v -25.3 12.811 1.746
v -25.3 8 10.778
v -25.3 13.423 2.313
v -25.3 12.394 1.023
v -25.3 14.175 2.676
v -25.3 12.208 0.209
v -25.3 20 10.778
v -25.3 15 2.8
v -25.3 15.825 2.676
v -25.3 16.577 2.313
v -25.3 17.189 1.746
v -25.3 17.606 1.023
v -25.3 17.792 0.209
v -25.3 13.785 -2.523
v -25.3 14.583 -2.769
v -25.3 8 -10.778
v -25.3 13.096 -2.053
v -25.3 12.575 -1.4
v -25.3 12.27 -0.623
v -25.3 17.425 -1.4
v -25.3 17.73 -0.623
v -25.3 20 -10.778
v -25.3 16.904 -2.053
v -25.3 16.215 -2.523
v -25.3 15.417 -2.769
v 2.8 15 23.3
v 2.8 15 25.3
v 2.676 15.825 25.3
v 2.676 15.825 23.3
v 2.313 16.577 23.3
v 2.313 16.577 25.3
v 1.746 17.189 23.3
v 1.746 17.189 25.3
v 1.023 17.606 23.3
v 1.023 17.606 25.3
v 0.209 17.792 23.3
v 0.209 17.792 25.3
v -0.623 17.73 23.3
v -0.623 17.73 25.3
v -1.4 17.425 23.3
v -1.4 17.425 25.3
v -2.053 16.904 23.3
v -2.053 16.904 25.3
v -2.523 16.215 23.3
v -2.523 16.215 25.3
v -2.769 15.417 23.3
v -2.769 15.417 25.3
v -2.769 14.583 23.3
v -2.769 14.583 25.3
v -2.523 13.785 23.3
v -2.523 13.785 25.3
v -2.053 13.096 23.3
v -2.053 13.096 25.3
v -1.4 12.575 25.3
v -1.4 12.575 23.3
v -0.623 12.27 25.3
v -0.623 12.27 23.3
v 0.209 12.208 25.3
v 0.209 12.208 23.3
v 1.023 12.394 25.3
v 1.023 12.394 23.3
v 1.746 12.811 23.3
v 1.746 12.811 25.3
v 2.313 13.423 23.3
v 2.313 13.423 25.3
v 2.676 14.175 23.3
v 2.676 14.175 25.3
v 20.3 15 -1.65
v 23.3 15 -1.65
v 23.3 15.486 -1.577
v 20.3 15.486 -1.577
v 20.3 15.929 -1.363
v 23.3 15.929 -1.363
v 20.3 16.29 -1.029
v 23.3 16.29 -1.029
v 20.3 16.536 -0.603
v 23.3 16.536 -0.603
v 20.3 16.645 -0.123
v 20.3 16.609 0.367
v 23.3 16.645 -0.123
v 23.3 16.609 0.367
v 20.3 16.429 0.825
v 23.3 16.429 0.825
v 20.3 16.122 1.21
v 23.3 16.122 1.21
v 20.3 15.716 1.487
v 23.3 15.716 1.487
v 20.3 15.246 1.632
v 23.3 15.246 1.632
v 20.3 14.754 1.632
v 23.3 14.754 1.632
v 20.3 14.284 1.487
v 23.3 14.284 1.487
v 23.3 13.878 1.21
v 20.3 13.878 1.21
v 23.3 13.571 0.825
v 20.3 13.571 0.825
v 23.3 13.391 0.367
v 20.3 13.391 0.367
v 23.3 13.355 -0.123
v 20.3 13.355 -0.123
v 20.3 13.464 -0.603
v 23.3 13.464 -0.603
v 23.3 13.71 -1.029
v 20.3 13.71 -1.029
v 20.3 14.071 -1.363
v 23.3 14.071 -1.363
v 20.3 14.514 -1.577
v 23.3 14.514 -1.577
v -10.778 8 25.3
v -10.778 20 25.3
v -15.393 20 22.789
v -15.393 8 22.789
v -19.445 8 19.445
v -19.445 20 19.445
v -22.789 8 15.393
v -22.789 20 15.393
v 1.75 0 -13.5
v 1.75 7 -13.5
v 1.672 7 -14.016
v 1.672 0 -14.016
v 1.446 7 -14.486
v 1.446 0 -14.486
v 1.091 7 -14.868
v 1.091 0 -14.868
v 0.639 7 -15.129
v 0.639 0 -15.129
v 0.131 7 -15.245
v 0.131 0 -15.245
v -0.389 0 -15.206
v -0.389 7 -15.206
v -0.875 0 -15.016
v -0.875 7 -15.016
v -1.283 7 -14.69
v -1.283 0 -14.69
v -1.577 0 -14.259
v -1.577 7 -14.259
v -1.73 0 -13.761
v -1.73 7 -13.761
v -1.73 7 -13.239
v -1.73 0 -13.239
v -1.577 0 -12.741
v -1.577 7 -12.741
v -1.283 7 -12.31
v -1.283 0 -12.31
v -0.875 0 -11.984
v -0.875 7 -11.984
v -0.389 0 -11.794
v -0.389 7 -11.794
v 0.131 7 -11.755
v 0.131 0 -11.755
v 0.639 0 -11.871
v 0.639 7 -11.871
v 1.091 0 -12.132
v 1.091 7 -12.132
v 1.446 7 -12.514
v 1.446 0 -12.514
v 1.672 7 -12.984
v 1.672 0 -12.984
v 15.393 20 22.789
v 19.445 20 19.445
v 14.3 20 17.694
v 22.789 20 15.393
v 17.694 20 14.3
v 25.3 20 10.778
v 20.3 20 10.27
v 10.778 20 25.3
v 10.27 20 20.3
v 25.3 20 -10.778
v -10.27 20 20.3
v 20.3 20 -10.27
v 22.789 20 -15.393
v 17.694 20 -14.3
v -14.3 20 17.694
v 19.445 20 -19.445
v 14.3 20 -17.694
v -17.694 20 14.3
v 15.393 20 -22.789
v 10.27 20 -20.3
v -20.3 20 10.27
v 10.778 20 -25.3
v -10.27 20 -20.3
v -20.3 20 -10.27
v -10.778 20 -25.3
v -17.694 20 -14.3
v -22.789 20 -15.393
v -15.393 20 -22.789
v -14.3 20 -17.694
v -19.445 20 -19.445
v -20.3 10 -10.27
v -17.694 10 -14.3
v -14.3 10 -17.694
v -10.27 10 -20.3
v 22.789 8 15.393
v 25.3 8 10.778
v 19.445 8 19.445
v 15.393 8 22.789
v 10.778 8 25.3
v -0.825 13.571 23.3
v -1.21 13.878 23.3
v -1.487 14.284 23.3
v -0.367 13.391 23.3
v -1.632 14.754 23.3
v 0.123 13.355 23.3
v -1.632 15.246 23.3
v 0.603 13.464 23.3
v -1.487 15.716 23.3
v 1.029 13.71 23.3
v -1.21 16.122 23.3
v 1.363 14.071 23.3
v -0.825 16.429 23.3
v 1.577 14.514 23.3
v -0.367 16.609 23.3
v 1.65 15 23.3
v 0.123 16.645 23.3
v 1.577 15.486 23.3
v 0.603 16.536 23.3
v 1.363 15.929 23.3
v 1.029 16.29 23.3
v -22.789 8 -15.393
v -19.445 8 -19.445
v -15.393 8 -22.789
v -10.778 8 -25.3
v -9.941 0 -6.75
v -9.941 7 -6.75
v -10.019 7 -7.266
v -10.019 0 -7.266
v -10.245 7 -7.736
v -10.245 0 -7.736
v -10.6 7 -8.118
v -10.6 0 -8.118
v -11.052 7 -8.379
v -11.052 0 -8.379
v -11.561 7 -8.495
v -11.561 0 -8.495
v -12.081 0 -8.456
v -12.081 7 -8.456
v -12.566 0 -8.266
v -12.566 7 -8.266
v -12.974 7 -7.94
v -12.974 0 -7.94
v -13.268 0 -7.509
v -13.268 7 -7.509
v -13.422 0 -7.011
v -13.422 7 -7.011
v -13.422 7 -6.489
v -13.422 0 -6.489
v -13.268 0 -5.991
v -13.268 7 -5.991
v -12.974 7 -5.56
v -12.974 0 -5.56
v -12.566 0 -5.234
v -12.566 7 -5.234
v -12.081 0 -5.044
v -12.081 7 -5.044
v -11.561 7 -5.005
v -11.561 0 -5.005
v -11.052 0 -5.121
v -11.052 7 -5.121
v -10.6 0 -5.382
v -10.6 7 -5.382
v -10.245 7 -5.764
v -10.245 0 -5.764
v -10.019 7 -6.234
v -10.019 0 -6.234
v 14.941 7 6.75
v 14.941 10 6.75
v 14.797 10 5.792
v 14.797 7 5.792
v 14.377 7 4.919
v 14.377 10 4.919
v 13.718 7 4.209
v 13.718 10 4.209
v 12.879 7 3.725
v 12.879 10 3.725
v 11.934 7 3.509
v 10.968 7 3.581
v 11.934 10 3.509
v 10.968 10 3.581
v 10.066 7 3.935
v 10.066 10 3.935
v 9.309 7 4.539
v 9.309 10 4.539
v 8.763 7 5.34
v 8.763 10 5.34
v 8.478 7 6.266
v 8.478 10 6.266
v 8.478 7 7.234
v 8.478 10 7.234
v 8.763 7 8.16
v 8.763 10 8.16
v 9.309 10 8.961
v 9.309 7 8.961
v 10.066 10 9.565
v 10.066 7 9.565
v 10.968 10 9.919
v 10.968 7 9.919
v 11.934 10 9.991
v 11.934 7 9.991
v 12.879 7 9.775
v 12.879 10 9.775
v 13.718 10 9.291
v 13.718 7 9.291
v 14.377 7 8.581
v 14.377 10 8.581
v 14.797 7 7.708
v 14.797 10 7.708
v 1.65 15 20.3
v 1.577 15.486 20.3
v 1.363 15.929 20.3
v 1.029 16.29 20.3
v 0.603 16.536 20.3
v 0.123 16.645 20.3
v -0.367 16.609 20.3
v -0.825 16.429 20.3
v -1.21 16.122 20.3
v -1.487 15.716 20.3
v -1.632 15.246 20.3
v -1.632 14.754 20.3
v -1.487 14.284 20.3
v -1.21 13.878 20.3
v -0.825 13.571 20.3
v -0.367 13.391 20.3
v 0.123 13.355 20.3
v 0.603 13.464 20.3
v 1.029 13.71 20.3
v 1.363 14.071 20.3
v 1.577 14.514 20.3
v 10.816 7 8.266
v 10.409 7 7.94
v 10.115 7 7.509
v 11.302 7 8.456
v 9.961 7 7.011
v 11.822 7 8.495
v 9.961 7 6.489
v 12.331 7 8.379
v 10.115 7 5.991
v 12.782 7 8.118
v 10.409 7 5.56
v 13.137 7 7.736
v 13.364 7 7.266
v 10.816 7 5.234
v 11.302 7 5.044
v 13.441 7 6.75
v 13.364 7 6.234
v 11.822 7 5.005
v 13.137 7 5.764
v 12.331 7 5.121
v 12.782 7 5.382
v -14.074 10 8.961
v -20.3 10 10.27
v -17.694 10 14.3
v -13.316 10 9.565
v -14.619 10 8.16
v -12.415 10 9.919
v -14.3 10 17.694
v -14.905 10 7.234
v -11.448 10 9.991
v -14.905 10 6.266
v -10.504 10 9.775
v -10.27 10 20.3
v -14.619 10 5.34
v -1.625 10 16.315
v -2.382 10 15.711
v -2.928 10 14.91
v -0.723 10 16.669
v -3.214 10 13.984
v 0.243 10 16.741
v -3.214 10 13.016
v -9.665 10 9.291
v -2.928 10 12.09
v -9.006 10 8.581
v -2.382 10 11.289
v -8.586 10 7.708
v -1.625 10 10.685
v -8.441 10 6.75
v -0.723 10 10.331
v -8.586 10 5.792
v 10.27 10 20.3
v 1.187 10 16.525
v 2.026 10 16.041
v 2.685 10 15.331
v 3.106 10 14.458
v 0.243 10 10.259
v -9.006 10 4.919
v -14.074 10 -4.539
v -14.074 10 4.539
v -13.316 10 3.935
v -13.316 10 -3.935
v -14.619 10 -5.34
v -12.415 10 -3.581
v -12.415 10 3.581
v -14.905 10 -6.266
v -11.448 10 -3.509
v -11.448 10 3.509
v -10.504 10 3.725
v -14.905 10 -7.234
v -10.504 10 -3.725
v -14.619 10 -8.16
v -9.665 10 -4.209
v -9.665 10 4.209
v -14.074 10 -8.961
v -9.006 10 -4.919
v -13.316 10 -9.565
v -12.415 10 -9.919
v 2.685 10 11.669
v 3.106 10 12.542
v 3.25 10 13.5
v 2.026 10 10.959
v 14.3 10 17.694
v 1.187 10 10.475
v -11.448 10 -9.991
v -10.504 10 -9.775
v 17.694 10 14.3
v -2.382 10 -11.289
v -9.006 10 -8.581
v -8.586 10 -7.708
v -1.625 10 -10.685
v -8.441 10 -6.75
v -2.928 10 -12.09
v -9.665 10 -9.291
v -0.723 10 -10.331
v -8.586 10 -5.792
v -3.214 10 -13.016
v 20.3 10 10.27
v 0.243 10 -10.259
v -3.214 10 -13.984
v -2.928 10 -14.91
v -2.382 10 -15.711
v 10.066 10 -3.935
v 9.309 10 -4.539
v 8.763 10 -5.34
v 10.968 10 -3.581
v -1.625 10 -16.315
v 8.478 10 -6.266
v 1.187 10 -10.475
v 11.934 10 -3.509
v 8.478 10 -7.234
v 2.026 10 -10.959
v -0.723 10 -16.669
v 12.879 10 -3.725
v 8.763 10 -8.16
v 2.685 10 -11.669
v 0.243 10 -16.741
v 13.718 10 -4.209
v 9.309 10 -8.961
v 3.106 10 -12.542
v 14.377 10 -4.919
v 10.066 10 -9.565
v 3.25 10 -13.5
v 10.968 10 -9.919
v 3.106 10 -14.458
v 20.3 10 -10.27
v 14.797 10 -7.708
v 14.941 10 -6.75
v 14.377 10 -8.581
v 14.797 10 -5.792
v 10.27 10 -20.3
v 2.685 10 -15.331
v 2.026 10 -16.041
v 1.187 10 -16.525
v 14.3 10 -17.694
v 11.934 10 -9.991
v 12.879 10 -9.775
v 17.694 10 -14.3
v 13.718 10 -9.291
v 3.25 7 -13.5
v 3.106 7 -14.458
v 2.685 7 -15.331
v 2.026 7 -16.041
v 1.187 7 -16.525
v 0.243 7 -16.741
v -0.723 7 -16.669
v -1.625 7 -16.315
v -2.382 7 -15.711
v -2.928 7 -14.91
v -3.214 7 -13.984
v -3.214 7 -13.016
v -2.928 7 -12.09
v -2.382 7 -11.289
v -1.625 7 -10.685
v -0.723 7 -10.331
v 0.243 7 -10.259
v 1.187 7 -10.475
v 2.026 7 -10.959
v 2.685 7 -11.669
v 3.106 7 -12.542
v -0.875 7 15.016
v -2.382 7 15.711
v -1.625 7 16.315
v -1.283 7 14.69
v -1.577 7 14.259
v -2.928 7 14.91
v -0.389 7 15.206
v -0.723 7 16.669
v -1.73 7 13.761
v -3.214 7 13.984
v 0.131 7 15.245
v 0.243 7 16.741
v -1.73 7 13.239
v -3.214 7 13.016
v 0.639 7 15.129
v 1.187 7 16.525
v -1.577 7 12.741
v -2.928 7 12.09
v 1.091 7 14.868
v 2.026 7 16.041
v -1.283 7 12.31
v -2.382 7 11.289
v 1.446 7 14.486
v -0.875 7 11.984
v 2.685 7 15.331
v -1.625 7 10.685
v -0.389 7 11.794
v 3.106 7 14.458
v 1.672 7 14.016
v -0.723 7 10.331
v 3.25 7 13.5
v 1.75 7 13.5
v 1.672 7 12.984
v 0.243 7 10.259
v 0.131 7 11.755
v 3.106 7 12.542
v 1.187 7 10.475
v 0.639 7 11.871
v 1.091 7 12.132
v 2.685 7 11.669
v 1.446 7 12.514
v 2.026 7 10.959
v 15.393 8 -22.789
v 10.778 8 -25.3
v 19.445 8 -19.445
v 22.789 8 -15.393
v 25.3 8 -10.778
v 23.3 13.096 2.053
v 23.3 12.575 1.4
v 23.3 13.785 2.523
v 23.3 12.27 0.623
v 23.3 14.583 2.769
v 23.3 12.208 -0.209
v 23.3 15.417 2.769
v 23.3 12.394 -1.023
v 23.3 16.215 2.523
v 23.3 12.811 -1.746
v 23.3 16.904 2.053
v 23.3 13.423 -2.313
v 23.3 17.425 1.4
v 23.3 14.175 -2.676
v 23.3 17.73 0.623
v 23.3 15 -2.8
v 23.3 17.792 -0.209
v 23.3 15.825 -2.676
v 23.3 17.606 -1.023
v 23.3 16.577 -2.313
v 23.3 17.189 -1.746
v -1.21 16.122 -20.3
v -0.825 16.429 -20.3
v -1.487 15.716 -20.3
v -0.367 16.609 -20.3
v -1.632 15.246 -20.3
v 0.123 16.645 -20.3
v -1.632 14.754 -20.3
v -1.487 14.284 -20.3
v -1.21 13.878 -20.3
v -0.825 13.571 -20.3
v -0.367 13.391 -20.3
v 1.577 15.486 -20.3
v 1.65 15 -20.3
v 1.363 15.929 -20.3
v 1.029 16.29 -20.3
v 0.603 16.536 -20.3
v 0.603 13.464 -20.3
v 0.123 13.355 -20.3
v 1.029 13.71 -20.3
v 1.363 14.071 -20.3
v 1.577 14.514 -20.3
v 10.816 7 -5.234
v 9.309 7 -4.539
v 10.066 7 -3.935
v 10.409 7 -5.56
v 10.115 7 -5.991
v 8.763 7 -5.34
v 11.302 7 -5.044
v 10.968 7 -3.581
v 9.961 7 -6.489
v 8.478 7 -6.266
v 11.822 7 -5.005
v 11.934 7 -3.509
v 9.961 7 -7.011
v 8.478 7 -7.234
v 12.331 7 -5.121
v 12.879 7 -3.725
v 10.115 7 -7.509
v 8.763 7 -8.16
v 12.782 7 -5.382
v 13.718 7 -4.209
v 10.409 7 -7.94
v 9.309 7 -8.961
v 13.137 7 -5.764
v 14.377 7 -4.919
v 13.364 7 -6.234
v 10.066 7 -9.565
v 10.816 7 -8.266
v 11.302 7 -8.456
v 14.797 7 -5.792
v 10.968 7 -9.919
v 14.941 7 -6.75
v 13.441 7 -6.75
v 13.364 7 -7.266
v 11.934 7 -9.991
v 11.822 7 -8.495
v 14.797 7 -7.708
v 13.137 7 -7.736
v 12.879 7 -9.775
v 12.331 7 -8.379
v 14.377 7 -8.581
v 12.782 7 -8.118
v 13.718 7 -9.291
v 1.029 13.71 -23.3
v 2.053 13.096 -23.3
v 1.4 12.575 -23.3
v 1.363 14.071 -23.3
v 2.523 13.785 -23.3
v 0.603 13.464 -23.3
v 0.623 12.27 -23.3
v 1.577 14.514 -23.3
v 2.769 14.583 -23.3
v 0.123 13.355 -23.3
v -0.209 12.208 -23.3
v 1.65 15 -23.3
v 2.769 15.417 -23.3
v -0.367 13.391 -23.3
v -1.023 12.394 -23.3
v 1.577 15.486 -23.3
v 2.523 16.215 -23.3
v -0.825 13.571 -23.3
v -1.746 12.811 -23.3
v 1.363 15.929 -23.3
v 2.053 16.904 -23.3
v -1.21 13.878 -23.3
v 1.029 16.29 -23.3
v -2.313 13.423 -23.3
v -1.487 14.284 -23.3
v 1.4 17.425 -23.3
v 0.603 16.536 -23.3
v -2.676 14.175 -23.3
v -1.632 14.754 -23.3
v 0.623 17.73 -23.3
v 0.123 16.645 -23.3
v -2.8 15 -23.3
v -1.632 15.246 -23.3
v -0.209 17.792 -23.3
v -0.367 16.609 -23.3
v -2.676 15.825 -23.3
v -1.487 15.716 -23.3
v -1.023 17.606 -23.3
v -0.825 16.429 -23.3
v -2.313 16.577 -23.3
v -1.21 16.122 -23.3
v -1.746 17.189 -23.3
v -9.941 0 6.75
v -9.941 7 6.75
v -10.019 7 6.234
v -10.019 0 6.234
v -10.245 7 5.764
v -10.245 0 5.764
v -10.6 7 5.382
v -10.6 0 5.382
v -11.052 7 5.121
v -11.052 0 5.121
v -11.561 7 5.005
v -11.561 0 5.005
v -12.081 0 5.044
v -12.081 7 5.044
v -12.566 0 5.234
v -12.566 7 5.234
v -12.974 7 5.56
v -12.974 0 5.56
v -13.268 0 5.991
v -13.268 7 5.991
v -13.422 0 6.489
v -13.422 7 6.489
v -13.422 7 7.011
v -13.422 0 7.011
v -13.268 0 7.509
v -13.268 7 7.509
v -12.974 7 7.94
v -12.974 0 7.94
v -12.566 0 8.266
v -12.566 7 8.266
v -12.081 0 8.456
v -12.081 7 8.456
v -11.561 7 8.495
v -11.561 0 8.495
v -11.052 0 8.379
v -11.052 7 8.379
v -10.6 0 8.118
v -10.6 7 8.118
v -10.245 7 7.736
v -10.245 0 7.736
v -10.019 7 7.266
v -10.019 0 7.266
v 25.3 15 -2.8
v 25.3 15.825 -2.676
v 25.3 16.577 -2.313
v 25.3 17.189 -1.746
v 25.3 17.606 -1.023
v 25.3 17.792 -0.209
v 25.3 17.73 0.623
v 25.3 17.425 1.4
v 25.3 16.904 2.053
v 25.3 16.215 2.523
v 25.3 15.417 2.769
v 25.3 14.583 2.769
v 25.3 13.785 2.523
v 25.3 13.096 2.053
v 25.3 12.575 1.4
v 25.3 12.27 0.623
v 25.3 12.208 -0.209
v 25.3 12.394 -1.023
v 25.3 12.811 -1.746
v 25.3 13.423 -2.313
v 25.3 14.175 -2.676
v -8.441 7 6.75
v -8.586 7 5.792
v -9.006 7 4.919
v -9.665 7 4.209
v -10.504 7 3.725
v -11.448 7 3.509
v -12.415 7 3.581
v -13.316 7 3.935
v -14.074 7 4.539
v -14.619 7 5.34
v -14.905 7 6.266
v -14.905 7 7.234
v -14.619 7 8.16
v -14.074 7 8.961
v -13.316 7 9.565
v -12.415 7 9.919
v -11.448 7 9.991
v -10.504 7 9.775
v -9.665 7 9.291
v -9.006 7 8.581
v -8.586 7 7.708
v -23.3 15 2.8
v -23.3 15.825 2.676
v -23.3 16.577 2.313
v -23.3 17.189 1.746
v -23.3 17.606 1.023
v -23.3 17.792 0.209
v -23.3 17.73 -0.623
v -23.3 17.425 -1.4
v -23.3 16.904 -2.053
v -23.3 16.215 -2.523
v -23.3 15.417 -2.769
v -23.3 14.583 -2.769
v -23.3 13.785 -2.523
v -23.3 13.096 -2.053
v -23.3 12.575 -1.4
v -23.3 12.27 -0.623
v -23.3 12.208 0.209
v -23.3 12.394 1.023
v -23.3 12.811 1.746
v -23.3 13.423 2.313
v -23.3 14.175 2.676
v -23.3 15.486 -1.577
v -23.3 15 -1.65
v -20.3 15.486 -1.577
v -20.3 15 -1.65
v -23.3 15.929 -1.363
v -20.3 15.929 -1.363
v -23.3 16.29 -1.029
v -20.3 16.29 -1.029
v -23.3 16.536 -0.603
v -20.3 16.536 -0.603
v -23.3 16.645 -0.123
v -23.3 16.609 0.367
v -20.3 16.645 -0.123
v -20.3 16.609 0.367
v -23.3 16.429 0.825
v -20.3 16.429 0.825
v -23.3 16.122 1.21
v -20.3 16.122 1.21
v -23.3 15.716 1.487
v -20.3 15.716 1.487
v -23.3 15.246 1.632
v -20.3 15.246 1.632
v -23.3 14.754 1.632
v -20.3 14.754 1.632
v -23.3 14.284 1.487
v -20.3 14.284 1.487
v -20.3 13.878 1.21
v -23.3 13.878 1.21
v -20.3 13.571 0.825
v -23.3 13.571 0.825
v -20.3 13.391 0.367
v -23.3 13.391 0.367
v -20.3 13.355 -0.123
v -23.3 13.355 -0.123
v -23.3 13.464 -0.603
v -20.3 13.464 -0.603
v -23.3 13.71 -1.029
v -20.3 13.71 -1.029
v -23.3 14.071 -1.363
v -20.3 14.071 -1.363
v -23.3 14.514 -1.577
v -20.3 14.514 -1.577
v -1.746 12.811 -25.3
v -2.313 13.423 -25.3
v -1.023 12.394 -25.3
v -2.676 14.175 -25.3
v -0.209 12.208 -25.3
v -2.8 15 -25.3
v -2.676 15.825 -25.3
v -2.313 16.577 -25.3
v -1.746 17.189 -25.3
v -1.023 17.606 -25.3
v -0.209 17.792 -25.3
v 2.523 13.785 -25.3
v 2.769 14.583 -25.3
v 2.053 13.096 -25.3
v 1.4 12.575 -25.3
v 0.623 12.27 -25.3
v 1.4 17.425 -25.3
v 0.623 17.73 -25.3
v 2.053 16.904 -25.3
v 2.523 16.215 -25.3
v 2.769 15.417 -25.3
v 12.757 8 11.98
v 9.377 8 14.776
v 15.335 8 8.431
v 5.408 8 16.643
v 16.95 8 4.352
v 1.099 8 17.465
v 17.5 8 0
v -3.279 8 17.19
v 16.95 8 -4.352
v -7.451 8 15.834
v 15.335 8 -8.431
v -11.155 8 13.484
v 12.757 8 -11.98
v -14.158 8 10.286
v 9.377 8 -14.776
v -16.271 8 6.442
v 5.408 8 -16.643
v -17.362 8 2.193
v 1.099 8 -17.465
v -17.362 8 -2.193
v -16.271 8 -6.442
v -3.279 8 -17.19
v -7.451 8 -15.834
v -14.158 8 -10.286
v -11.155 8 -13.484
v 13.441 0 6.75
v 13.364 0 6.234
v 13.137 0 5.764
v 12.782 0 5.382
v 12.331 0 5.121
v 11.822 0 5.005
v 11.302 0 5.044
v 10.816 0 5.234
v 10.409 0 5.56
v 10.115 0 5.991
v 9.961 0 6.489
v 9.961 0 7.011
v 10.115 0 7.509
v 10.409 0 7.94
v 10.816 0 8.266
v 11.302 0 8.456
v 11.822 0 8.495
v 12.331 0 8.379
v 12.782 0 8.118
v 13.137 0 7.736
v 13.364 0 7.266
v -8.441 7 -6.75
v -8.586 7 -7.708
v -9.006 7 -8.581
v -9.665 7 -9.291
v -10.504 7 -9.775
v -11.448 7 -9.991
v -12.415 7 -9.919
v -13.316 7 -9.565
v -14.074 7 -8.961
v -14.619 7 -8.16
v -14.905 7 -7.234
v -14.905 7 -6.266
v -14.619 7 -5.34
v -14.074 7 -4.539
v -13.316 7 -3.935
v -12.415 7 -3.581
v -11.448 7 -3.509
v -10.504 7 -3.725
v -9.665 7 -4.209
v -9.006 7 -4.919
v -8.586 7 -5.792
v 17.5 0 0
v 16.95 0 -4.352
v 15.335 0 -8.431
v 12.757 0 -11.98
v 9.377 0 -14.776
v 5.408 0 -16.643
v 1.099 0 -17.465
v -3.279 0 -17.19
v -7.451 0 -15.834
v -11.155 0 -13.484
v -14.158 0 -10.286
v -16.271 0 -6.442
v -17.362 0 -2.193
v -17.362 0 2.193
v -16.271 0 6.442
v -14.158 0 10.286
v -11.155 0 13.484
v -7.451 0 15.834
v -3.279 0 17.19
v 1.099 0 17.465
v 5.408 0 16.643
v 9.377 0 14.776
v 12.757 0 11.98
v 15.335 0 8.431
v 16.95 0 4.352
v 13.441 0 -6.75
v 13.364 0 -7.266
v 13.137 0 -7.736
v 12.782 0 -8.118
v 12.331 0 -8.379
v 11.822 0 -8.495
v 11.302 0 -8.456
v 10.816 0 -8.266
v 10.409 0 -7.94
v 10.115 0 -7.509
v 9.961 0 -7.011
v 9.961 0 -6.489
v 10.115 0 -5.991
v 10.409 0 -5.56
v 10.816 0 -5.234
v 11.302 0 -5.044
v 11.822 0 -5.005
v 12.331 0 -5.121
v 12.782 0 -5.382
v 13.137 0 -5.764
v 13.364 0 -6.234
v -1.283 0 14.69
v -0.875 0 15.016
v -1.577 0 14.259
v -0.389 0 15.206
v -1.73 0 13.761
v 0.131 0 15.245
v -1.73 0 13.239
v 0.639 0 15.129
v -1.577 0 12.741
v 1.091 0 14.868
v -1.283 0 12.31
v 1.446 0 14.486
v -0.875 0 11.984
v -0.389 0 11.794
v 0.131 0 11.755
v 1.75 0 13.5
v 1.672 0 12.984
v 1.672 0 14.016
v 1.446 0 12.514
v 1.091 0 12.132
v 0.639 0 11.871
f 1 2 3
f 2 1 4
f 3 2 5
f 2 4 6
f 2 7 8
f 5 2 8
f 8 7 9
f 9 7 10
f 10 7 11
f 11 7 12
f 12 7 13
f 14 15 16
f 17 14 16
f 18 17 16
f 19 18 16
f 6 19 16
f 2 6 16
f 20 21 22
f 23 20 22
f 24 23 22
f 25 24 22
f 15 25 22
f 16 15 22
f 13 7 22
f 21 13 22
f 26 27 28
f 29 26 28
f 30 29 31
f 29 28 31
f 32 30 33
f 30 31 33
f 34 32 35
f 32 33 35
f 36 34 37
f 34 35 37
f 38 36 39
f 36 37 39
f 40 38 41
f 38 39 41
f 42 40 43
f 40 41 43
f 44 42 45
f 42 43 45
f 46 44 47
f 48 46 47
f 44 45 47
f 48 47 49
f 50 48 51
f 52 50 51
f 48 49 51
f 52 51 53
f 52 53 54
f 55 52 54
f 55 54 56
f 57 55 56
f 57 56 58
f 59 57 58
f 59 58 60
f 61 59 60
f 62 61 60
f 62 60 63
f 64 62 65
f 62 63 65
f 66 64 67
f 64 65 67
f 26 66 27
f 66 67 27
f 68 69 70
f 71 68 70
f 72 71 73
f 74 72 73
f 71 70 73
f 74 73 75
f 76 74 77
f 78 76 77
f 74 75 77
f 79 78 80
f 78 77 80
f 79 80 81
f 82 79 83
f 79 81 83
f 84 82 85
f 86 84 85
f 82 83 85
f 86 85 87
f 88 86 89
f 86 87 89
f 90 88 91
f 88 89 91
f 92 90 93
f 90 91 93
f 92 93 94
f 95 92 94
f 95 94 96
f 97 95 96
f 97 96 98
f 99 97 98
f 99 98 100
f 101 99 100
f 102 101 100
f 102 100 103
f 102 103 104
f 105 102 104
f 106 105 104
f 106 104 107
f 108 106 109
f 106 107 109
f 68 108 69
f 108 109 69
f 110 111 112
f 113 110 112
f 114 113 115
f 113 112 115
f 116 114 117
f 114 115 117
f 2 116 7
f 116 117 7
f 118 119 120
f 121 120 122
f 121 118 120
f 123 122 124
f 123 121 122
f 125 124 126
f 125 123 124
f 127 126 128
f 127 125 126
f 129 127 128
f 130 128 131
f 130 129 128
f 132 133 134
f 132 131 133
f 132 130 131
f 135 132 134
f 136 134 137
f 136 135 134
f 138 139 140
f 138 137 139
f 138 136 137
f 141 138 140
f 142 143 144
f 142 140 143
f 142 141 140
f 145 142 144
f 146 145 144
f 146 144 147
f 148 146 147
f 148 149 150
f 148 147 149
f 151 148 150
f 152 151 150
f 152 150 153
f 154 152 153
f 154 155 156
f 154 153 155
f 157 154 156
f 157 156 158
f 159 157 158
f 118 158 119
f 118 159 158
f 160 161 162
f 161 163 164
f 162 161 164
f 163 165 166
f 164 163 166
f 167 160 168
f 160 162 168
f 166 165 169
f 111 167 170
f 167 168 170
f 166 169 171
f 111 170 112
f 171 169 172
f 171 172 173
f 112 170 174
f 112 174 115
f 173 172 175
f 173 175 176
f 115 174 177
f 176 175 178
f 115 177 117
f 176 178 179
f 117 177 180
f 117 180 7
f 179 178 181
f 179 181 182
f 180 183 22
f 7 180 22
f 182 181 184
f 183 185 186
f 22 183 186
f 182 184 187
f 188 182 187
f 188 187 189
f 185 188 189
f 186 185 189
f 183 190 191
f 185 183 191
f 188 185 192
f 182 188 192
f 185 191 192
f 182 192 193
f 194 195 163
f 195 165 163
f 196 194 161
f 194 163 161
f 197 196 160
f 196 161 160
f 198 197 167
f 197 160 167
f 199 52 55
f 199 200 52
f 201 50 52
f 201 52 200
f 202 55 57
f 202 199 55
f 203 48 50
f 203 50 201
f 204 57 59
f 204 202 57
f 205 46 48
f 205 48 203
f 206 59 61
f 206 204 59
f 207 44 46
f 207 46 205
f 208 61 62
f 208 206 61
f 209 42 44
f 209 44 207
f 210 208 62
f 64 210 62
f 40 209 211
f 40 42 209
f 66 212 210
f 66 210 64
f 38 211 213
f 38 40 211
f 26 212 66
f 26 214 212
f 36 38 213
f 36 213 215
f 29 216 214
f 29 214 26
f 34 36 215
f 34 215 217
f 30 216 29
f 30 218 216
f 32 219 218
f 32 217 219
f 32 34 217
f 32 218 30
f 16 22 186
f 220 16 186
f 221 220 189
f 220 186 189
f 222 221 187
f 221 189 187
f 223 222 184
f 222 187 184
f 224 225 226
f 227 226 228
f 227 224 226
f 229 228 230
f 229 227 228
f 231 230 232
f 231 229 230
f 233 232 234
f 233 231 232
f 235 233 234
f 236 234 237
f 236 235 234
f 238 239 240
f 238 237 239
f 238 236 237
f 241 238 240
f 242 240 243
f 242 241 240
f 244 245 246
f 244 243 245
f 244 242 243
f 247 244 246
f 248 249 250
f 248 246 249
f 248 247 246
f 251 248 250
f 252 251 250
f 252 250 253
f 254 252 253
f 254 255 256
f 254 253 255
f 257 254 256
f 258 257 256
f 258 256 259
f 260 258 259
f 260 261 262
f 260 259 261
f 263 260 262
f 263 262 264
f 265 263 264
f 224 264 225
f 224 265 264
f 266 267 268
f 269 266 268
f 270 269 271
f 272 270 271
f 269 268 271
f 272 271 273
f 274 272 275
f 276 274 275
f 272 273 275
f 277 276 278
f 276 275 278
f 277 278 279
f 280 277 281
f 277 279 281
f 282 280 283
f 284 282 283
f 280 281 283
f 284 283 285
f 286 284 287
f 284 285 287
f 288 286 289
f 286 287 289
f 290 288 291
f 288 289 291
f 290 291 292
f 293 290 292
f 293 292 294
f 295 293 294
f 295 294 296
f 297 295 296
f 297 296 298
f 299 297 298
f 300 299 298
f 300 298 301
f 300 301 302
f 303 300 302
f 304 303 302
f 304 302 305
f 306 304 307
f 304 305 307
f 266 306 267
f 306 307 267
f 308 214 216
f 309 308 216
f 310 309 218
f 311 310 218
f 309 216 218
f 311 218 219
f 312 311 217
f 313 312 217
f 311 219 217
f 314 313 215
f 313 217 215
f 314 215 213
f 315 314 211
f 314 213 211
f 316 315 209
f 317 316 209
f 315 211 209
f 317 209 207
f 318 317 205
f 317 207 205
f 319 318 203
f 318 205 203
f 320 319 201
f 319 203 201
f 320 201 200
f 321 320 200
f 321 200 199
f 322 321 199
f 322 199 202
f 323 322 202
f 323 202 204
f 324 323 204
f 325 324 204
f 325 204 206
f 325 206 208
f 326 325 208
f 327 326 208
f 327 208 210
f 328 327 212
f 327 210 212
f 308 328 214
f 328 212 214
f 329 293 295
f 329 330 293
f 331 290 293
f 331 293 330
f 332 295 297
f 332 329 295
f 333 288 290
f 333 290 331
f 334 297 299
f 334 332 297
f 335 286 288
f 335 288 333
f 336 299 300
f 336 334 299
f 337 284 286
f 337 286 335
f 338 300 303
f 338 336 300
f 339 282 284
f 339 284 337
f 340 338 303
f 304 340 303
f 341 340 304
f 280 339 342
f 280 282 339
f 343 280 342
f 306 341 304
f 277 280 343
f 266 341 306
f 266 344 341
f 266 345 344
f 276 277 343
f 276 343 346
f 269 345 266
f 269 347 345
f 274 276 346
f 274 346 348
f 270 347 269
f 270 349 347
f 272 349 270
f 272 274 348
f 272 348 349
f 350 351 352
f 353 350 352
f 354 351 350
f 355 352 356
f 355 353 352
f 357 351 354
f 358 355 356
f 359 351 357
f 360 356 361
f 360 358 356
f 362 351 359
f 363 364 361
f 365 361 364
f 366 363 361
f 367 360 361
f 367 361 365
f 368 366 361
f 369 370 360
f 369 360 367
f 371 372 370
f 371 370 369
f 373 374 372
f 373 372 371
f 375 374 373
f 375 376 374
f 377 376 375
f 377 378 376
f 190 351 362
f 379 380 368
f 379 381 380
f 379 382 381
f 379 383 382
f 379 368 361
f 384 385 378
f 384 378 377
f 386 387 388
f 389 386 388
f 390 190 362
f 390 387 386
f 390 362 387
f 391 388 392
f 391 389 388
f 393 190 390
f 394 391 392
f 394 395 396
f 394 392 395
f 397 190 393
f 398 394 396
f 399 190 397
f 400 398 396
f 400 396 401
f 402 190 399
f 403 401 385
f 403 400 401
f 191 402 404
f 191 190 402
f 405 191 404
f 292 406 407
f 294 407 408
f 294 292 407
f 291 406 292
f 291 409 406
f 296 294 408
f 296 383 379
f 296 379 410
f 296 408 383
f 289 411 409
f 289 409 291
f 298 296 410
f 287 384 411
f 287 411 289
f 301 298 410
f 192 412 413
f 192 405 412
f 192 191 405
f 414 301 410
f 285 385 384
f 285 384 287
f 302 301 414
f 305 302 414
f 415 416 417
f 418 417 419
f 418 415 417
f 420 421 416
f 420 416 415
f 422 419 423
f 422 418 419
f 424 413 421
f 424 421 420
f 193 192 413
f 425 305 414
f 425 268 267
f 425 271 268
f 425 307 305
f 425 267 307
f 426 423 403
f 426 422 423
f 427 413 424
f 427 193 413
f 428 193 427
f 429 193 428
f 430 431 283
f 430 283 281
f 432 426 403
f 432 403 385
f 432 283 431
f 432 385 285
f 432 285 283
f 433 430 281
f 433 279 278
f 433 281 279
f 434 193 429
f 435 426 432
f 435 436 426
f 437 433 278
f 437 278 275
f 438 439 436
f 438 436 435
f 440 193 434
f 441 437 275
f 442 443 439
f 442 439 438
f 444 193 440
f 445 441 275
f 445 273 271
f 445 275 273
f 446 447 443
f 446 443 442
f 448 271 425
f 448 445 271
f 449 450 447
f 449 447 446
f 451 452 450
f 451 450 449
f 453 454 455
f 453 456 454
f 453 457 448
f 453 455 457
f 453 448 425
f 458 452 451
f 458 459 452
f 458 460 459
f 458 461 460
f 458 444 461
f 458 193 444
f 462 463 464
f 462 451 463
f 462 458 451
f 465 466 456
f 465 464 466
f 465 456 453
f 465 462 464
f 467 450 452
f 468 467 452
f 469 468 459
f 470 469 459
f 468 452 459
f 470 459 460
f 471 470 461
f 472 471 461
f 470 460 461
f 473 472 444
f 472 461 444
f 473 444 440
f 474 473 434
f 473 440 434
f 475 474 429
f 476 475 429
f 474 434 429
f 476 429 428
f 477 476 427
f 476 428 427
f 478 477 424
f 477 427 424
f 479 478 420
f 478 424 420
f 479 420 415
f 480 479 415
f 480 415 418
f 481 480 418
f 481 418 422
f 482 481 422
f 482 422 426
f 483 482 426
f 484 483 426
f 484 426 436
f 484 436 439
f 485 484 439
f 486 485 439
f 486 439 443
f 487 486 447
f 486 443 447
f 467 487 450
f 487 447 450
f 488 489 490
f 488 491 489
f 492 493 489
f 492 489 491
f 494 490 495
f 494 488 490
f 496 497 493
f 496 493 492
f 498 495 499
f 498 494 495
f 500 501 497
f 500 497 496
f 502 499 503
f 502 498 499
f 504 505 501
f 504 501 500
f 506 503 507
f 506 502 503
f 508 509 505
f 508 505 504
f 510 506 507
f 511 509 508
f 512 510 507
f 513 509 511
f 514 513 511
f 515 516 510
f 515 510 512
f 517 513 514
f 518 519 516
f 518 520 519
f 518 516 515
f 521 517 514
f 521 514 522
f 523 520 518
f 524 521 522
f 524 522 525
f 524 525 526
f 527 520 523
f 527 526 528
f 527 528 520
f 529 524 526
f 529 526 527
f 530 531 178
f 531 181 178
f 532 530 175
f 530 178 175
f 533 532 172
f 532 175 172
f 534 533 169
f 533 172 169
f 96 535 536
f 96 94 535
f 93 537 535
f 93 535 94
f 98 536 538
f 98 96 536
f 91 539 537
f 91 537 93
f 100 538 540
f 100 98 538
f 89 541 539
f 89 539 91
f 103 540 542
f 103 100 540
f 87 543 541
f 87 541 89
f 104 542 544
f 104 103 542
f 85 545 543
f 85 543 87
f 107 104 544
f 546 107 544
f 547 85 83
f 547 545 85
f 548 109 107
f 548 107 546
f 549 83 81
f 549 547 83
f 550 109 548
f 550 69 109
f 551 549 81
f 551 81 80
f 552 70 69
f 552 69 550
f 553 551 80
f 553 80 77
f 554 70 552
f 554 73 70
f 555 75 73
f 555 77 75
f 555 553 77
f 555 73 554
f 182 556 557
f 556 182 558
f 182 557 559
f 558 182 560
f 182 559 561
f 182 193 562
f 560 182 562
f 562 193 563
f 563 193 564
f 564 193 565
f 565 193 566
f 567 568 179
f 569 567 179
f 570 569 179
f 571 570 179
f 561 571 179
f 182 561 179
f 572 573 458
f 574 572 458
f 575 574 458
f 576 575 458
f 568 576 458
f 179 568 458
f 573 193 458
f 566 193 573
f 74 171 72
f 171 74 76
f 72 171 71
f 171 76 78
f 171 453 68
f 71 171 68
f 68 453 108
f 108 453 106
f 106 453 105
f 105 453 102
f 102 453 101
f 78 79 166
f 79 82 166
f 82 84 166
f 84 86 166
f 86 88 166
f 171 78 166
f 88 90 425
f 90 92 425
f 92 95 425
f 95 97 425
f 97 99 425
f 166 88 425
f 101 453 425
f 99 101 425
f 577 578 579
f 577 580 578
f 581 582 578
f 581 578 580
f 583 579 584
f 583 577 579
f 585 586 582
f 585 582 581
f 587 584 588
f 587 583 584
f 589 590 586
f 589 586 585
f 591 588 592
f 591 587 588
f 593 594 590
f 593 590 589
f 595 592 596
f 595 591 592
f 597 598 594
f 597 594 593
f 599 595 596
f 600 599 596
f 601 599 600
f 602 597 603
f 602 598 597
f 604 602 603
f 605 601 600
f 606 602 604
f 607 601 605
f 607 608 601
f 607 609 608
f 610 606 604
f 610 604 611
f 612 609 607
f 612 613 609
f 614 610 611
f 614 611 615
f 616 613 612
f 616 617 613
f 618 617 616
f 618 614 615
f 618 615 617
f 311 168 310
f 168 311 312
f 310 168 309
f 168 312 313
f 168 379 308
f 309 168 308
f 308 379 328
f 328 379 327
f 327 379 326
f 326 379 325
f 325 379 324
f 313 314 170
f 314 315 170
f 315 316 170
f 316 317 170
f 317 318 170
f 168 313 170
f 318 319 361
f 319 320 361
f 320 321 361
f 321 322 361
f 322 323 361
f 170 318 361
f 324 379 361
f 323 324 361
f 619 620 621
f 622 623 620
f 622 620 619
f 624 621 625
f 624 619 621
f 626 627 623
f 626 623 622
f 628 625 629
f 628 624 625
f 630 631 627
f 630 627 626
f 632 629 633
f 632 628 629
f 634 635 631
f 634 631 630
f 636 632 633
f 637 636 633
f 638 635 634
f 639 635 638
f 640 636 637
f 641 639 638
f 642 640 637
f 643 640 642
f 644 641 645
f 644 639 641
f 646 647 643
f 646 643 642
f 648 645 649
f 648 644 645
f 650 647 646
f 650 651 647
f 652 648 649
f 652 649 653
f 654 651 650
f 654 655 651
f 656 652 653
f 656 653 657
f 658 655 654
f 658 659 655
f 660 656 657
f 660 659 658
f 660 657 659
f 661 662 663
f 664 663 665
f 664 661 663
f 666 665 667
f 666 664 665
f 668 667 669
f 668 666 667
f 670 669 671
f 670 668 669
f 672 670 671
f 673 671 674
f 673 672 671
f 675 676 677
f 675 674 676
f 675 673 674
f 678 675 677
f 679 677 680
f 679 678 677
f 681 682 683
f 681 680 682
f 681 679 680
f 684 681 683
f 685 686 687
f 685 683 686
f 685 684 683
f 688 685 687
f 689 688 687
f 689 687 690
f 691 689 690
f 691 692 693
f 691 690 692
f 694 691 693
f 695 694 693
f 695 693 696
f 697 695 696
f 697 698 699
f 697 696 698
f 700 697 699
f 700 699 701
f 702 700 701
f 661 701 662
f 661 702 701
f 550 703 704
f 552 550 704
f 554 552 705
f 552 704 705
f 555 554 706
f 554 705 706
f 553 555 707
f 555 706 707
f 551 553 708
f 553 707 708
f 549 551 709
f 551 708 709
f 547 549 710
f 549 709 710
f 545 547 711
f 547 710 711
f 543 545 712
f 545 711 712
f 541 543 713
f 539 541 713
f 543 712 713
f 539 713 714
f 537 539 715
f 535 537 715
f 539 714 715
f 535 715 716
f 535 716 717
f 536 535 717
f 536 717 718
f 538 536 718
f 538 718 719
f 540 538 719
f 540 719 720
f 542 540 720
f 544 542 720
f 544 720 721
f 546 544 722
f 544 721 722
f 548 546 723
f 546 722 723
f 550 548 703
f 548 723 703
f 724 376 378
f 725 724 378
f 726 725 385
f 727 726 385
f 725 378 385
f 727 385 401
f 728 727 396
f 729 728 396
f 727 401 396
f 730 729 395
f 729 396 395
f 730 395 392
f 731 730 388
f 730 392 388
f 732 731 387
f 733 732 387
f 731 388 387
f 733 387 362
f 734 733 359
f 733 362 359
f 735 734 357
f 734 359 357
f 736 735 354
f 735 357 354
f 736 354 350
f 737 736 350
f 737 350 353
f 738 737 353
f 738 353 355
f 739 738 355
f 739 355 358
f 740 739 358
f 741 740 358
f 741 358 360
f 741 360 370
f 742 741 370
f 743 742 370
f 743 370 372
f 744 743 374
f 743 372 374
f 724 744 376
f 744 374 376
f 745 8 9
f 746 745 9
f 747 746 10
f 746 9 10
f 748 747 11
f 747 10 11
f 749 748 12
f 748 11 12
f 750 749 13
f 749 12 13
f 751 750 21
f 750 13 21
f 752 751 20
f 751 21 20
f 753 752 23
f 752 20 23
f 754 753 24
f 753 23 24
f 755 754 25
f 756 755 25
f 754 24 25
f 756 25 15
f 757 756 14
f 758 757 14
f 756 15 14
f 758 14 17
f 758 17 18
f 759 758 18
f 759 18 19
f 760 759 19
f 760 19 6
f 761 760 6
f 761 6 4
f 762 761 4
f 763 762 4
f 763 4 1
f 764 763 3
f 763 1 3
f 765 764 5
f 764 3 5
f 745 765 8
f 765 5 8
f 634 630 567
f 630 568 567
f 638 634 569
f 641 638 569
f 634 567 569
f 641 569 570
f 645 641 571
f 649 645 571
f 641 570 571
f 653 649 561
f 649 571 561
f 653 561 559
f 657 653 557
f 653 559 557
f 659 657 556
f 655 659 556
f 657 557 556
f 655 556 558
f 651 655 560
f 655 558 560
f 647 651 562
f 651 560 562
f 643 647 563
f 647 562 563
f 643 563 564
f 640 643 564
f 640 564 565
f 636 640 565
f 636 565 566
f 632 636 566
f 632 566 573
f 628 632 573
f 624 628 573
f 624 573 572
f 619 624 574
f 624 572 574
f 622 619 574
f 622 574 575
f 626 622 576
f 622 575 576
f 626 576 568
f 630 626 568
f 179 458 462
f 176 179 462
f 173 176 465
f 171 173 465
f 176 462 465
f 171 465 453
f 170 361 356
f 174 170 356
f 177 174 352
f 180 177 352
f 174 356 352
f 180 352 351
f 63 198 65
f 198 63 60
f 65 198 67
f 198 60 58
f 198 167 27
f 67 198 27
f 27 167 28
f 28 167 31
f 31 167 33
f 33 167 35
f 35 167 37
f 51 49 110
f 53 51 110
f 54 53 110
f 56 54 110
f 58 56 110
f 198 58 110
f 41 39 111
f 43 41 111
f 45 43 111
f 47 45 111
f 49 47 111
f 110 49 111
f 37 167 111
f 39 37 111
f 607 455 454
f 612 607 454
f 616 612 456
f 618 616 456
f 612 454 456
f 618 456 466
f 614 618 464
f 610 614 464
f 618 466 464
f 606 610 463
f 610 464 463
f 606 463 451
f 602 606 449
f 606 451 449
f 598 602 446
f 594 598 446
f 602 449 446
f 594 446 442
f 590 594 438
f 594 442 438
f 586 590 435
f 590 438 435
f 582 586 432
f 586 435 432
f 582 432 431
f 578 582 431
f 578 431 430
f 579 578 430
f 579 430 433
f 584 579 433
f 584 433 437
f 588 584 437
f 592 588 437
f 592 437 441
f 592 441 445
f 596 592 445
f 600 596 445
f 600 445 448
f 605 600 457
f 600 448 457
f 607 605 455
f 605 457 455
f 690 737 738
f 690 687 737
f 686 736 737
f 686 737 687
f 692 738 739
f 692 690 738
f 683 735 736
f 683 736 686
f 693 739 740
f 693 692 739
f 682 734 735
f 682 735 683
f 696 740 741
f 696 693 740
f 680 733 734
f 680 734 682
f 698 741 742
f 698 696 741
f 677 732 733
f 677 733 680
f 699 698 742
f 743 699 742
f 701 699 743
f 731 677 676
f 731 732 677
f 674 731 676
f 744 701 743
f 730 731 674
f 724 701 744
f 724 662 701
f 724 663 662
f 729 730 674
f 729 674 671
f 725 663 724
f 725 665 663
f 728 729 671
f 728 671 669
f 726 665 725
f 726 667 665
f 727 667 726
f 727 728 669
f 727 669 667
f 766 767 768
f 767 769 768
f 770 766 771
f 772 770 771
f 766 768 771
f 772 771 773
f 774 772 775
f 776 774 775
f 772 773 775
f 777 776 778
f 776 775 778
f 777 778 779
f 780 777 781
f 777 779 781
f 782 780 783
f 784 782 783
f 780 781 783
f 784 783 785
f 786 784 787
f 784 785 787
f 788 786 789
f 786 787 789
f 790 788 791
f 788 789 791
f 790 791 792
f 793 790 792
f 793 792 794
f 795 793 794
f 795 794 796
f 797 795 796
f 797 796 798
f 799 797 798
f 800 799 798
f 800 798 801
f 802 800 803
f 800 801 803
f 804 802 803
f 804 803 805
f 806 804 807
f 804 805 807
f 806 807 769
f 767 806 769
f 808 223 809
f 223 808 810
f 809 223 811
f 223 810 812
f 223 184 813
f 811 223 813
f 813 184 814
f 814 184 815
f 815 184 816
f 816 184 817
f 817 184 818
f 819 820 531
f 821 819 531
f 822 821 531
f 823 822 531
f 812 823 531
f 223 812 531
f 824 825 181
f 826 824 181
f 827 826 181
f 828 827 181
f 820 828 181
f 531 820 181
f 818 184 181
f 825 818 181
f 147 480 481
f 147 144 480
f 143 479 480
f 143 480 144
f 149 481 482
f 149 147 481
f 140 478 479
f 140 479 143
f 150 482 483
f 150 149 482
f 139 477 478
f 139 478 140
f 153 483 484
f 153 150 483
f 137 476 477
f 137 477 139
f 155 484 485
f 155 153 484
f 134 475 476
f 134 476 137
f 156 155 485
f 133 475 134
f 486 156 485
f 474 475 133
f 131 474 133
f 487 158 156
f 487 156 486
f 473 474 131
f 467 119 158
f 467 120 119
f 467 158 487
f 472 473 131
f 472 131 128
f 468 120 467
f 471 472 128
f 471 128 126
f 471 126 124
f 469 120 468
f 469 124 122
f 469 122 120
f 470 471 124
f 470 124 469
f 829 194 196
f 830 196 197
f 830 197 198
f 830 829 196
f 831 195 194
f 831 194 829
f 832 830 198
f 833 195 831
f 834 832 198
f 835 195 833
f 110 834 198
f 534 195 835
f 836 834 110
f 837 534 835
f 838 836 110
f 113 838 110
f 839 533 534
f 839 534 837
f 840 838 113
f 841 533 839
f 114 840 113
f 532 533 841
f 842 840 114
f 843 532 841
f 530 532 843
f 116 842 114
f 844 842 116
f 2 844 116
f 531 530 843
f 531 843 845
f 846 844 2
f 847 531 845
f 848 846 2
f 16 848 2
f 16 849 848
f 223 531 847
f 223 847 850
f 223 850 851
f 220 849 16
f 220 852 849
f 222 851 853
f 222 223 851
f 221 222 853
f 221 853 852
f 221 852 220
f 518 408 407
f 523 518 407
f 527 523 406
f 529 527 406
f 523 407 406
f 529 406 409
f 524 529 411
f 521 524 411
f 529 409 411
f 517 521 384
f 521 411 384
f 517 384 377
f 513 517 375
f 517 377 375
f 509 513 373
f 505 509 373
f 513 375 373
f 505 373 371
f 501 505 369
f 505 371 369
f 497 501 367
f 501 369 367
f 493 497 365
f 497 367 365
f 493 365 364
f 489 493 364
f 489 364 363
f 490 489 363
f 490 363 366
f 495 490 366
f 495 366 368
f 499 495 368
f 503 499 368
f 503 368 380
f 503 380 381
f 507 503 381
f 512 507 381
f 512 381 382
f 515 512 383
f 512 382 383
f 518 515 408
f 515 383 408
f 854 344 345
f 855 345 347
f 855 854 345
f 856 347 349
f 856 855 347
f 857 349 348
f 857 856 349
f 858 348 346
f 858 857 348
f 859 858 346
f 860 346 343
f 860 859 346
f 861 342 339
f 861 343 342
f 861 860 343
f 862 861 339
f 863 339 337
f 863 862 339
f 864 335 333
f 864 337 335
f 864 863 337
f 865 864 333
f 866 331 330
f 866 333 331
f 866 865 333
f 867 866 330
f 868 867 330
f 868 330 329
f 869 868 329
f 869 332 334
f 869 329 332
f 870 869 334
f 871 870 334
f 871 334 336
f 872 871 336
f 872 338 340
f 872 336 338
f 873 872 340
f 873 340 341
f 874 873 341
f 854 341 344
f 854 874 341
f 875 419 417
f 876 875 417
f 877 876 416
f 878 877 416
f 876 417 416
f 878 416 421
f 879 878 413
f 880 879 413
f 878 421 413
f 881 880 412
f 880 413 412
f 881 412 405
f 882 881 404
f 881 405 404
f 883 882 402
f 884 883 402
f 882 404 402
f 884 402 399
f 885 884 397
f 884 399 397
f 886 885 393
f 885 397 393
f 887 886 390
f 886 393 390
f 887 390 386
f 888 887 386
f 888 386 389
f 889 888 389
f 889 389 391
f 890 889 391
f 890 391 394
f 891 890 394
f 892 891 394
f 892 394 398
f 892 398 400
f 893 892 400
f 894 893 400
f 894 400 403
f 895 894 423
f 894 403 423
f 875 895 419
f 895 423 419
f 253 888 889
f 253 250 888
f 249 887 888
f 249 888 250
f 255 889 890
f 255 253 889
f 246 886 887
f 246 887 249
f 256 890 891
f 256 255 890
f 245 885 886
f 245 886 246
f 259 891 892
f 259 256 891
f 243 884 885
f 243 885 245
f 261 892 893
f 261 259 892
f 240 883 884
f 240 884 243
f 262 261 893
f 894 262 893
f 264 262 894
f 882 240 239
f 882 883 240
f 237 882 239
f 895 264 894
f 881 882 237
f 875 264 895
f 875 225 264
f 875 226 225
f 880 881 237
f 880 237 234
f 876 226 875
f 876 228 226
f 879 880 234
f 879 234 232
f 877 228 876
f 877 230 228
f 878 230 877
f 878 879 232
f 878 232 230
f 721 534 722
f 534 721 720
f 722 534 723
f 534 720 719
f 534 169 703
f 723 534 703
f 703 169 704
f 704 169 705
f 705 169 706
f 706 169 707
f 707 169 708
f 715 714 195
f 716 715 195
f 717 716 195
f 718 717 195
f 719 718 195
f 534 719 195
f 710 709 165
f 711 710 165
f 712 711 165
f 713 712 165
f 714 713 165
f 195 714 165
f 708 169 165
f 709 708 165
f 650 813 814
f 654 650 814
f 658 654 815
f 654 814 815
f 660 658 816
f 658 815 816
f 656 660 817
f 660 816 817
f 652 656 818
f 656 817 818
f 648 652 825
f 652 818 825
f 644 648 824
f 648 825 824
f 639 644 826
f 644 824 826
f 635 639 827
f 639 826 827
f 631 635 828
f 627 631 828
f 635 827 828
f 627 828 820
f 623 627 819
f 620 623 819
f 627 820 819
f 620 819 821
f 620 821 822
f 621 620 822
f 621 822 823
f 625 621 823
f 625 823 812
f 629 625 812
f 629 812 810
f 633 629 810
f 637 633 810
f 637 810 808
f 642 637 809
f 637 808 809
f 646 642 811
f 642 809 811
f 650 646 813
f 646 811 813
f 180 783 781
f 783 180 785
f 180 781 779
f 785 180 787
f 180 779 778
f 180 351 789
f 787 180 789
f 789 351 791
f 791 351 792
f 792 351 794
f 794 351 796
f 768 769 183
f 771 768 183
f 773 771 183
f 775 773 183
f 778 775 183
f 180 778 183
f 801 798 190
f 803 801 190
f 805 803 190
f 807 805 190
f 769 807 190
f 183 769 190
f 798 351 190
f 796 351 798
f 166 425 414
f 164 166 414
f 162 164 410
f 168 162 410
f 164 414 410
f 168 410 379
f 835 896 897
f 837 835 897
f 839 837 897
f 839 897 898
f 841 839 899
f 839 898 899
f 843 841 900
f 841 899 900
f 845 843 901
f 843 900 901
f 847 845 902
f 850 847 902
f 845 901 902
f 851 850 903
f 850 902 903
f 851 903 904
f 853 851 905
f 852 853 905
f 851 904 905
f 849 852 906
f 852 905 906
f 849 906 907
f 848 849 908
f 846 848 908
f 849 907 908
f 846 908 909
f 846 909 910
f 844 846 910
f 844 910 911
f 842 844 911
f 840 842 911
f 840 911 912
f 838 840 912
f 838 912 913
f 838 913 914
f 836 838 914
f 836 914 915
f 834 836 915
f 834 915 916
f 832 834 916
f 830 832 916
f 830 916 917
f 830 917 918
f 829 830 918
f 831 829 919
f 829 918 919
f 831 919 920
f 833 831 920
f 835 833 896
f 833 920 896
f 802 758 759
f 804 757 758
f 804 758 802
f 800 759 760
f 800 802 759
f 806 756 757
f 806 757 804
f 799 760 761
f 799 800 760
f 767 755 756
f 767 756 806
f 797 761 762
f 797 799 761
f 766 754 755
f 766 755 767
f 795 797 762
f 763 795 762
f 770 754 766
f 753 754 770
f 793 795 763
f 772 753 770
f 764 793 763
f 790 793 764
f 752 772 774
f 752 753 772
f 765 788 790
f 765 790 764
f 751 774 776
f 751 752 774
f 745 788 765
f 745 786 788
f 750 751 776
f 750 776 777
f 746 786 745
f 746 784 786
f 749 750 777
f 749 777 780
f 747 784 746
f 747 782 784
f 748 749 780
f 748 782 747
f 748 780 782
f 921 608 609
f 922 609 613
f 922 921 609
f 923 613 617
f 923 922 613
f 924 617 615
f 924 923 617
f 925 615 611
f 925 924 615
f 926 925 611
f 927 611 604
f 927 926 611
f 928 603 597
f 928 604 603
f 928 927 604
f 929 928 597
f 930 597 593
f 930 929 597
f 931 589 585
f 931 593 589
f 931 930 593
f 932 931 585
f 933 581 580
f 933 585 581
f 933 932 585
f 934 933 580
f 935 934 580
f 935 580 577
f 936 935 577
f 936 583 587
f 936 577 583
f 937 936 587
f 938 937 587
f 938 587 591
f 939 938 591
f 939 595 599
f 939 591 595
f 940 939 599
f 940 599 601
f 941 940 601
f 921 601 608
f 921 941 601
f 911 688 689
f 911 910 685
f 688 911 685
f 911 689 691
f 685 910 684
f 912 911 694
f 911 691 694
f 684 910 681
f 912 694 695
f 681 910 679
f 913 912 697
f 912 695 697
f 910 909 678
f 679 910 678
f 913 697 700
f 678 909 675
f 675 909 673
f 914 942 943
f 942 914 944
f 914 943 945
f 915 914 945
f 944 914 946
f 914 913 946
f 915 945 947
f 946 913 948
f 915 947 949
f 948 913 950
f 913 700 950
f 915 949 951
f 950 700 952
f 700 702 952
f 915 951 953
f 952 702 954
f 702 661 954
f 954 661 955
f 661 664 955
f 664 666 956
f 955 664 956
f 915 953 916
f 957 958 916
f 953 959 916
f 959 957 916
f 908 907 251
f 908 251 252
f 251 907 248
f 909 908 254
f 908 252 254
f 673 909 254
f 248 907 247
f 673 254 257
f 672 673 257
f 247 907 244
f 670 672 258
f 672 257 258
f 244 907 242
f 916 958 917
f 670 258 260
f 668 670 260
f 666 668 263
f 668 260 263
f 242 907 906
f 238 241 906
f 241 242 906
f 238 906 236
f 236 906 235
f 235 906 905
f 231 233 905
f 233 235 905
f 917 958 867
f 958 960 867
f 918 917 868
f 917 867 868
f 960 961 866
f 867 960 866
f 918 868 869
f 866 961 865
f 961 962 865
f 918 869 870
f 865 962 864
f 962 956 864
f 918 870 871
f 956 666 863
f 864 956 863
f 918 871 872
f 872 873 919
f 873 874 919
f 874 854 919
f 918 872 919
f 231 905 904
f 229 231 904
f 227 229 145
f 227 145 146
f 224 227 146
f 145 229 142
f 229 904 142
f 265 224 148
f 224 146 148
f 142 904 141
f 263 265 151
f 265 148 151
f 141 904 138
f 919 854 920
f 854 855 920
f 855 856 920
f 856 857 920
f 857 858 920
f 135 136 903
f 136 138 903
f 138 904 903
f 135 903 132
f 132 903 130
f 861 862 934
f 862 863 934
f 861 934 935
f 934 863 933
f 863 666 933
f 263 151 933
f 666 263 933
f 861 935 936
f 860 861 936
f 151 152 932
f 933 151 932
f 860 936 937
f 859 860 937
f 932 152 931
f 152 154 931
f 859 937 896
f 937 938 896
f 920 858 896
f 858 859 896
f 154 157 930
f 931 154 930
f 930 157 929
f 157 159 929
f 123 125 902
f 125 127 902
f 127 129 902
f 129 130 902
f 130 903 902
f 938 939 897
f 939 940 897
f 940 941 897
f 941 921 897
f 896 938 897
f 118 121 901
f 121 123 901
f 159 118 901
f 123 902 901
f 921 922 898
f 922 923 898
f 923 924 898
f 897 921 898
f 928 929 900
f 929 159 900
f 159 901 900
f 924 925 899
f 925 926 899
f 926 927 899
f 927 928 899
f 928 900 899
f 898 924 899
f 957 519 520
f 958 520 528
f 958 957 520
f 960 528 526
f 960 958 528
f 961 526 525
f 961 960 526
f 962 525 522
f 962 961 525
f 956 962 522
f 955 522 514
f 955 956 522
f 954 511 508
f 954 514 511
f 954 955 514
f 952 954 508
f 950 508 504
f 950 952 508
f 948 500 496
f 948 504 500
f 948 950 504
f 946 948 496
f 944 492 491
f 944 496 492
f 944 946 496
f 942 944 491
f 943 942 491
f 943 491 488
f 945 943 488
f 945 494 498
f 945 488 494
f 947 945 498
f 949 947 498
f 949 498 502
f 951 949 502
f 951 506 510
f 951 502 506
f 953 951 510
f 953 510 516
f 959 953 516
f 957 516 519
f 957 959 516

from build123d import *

# Parameters (mm, degrees)
SKETCH_1_R           = 17.5
SKETCH_1_R_2         = 1.75
EXTRUDE_1_DEPTH      = 10
SKETCH_2_R           = 25
SKETCH_2_R_2         = 17.5
EXTRUDE_2_DEPTH      = 2
SKETCH_3_R           = 3.25
CUT_EXTRUDE_1_DEPTH  = 3
EXTRUDE_3_DEPTH      = 10
EXTRUDE_3_DEPTH_BACK = 2
SKETCH_6_R           = 1.65
CUT_EXTRUDE_2_DEPTH  = 54.5
SKETCH_7_R           = 1.65
CUT_EXTRUDE_3_DEPTH  = 54.5
SKETCH_8_R           = 2.8
CUT_EXTRUDE_4_DEPTH  = 2
SKETCH_9_R           = 2.8
CUT_EXTRUDE_5_DEPTH  = 2
SKETCH_10_R          = 2.8
CUT_EXTRUDE_6_DEPTH  = 2
SKETCH_11_R          = 2.8
CUT_EXTRUDE_7_DEPTH  = 2


with BuildPart() as part:
    # 草图1 → 凸台-拉伸1 (new body)
    with BuildSketch(Plane(origin=(0, 0, 0), x_dir=(1, 0, 0), z_dir=(0, 1, 0))):
        Circle(SKETCH_1_R)
        with Locations((0, 13.5)):
            Circle(SKETCH_1_R_2, mode=Mode.SUBTRACT)
        with Locations((11.691342951, 6.75)):
            Circle(SKETCH_1_R_2, mode=Mode.SUBTRACT)
        with Locations((11.691342951, -6.75)):
            Circle(SKETCH_1_R_2, mode=Mode.SUBTRACT)
        with Locations((0, -13.5)):
            Circle(SKETCH_1_R_2, mode=Mode.SUBTRACT)
        with Locations((-11.691342951, -6.75)):
            Circle(SKETCH_1_R_2, mode=Mode.SUBTRACT)
        with Locations((-11.691342951, 6.75)):
            Circle(SKETCH_1_R_2, mode=Mode.SUBTRACT)
    extrude(amount=EXTRUDE_1_DEPTH)

    # 草图2 → 凸台-拉伸2 (add)
    with BuildSketch(Plane(origin=(0, 10, 0), x_dir=(1, 0, 0), z_dir=(0, 1, 0))):
        Circle(SKETCH_2_R)
        Circle(SKETCH_2_R_2, mode=Mode.SUBTRACT)
    extrude(amount=-EXTRUDE_2_DEPTH)

    # 草图3 → 切除-拉伸1 (cut)
    with BuildSketch(Plane(origin=(0, 10, 0), x_dir=(1, 0, 0), z_dir=(0, 1, 0))):
        with Locations((0, 13.5)):
            Circle(SKETCH_3_R)
        with Locations((11.691342951, 6.75)):
            Circle(SKETCH_3_R)
        with Locations((11.691342951, -6.75)):
            Circle(SKETCH_3_R)
        with Locations((0, -13.5)):
            Circle(SKETCH_3_R)
        with Locations((-11.691342951, -6.75)):
            Circle(SKETCH_3_R)
        with Locations((-11.691342951, 6.75)):
            Circle(SKETCH_3_R)
    extrude(amount=-CUT_EXTRUDE_1_DEPTH, mode=Mode.SUBTRACT)

    # 草图4 → 凸台-拉伸3 (add, two sides)
    with BuildSketch(Plane(origin=(0, 10, 0), x_dir=(1, 0, 0), z_dir=(0, 1, 0))) as extrude_3_sk:
        with BuildLine():
            Line((-10.777754868, 25.3), (10.777754868, 25.3))
            ThreePointArc((10.777754868, 25.3), (19.445436483, 19.445436483), (25.3, 10.777754868))
            Line((25.3, 10.777754868), (25.3, -10.777754868))
            ThreePointArc((25.3, -10.777754868), (19.445436483, -19.445436483), (10.777754868, -25.3))
            Line((10.777754868, -25.3), (-10.777754868, -25.3))
            ThreePointArc((-10.777754868, -25.3), (-19.445436483, -19.445436483), (-25.3, -10.777754868))
            Line((-25.3, -10.777754868), (-25.3, 10.777754868))
            ThreePointArc((-25.3, 10.777754868), (-19.445436483, 19.445436483), (-10.777754868, 25.3))
        make_face()
        with BuildLine():
            Line((-10.269980526, 20.3), (10.269980526, 20.3))
            ThreePointArc((10.269980526, 20.3), (16.086679272, 16.086679272), (20.3, 10.269980526))
            Line((20.3, 10.269980526), (20.3, -10.269980526))
            ThreePointArc((20.3, -10.269980526), (16.086679272, -16.086679272), (10.269980526, -20.3))
            Line((10.269980526, -20.3), (-10.269980526, -20.3))
            ThreePointArc((-10.269980526, -20.3), (-16.086679272, -16.086679272), (-20.3, -10.269980526))
            Line((-20.3, -10.269980526), (-20.3, 10.269980526))
            ThreePointArc((-20.3, 10.269980526), (-16.086679272, 16.086679272), (-10.269980526, 20.3))
        make_face(mode=Mode.SUBTRACT)
    extrude(amount=EXTRUDE_3_DEPTH)
    extrude(extrude_3_sk.sketch, amount=-EXTRUDE_3_DEPTH_BACK)

    # 草图6 → 切除-拉伸2 (cut, symmetric)
    with BuildSketch(Plane.XY.offset(25.3)):
        with Locations((0, 15)):
            Circle(SKETCH_6_R)
    extrude(amount=CUT_EXTRUDE_2_DEPTH, both=True, mode=Mode.SUBTRACT)

    # 草图7 → 切除-拉伸3 (cut, symmetric)
    with BuildSketch(Plane(origin=(25.3, 0, 0), x_dir=(0, 0, -1), z_dir=(1, 0, 0))):
        with Locations((0, 15)):
            Circle(SKETCH_7_R)
    extrude(amount=CUT_EXTRUDE_3_DEPTH, both=True, mode=Mode.SUBTRACT)

    # 草图8 → 切除-拉伸4 (cut)
    with BuildSketch(Plane(origin=(25.3, 0, 0), x_dir=(0, 0, -1), z_dir=(1, 0, 0))):
        with Locations((0, 15)):
            Circle(SKETCH_8_R)
    extrude(amount=-CUT_EXTRUDE_4_DEPTH, mode=Mode.SUBTRACT)

    # 草图9 → 切除-拉伸5 (cut)
    with BuildSketch(Plane(origin=(0, 0, -25.3), x_dir=(-1, 0, 0), z_dir=(0, 0, -1))):
        with Locations((0, 15)):
            Circle(SKETCH_9_R)
    extrude(amount=-CUT_EXTRUDE_5_DEPTH, mode=Mode.SUBTRACT)

    # 草图10 → 切除-拉伸6 (cut)
    with BuildSketch(Plane.ZY.offset(25.3)):
        with Locations((0, 15)):
            Circle(SKETCH_10_R)
    extrude(amount=-CUT_EXTRUDE_6_DEPTH, mode=Mode.SUBTRACT)

    # 草图11 → 切除-拉伸7 (cut)
    with BuildSketch(Plane.XY.offset(25.3)):
        with Locations((0, 15)):
            Circle(SKETCH_11_R)
    extrude(amount=-CUT_EXTRUDE_7_DEPTH, mode=Mode.SUBTRACT)


solid = part.part
